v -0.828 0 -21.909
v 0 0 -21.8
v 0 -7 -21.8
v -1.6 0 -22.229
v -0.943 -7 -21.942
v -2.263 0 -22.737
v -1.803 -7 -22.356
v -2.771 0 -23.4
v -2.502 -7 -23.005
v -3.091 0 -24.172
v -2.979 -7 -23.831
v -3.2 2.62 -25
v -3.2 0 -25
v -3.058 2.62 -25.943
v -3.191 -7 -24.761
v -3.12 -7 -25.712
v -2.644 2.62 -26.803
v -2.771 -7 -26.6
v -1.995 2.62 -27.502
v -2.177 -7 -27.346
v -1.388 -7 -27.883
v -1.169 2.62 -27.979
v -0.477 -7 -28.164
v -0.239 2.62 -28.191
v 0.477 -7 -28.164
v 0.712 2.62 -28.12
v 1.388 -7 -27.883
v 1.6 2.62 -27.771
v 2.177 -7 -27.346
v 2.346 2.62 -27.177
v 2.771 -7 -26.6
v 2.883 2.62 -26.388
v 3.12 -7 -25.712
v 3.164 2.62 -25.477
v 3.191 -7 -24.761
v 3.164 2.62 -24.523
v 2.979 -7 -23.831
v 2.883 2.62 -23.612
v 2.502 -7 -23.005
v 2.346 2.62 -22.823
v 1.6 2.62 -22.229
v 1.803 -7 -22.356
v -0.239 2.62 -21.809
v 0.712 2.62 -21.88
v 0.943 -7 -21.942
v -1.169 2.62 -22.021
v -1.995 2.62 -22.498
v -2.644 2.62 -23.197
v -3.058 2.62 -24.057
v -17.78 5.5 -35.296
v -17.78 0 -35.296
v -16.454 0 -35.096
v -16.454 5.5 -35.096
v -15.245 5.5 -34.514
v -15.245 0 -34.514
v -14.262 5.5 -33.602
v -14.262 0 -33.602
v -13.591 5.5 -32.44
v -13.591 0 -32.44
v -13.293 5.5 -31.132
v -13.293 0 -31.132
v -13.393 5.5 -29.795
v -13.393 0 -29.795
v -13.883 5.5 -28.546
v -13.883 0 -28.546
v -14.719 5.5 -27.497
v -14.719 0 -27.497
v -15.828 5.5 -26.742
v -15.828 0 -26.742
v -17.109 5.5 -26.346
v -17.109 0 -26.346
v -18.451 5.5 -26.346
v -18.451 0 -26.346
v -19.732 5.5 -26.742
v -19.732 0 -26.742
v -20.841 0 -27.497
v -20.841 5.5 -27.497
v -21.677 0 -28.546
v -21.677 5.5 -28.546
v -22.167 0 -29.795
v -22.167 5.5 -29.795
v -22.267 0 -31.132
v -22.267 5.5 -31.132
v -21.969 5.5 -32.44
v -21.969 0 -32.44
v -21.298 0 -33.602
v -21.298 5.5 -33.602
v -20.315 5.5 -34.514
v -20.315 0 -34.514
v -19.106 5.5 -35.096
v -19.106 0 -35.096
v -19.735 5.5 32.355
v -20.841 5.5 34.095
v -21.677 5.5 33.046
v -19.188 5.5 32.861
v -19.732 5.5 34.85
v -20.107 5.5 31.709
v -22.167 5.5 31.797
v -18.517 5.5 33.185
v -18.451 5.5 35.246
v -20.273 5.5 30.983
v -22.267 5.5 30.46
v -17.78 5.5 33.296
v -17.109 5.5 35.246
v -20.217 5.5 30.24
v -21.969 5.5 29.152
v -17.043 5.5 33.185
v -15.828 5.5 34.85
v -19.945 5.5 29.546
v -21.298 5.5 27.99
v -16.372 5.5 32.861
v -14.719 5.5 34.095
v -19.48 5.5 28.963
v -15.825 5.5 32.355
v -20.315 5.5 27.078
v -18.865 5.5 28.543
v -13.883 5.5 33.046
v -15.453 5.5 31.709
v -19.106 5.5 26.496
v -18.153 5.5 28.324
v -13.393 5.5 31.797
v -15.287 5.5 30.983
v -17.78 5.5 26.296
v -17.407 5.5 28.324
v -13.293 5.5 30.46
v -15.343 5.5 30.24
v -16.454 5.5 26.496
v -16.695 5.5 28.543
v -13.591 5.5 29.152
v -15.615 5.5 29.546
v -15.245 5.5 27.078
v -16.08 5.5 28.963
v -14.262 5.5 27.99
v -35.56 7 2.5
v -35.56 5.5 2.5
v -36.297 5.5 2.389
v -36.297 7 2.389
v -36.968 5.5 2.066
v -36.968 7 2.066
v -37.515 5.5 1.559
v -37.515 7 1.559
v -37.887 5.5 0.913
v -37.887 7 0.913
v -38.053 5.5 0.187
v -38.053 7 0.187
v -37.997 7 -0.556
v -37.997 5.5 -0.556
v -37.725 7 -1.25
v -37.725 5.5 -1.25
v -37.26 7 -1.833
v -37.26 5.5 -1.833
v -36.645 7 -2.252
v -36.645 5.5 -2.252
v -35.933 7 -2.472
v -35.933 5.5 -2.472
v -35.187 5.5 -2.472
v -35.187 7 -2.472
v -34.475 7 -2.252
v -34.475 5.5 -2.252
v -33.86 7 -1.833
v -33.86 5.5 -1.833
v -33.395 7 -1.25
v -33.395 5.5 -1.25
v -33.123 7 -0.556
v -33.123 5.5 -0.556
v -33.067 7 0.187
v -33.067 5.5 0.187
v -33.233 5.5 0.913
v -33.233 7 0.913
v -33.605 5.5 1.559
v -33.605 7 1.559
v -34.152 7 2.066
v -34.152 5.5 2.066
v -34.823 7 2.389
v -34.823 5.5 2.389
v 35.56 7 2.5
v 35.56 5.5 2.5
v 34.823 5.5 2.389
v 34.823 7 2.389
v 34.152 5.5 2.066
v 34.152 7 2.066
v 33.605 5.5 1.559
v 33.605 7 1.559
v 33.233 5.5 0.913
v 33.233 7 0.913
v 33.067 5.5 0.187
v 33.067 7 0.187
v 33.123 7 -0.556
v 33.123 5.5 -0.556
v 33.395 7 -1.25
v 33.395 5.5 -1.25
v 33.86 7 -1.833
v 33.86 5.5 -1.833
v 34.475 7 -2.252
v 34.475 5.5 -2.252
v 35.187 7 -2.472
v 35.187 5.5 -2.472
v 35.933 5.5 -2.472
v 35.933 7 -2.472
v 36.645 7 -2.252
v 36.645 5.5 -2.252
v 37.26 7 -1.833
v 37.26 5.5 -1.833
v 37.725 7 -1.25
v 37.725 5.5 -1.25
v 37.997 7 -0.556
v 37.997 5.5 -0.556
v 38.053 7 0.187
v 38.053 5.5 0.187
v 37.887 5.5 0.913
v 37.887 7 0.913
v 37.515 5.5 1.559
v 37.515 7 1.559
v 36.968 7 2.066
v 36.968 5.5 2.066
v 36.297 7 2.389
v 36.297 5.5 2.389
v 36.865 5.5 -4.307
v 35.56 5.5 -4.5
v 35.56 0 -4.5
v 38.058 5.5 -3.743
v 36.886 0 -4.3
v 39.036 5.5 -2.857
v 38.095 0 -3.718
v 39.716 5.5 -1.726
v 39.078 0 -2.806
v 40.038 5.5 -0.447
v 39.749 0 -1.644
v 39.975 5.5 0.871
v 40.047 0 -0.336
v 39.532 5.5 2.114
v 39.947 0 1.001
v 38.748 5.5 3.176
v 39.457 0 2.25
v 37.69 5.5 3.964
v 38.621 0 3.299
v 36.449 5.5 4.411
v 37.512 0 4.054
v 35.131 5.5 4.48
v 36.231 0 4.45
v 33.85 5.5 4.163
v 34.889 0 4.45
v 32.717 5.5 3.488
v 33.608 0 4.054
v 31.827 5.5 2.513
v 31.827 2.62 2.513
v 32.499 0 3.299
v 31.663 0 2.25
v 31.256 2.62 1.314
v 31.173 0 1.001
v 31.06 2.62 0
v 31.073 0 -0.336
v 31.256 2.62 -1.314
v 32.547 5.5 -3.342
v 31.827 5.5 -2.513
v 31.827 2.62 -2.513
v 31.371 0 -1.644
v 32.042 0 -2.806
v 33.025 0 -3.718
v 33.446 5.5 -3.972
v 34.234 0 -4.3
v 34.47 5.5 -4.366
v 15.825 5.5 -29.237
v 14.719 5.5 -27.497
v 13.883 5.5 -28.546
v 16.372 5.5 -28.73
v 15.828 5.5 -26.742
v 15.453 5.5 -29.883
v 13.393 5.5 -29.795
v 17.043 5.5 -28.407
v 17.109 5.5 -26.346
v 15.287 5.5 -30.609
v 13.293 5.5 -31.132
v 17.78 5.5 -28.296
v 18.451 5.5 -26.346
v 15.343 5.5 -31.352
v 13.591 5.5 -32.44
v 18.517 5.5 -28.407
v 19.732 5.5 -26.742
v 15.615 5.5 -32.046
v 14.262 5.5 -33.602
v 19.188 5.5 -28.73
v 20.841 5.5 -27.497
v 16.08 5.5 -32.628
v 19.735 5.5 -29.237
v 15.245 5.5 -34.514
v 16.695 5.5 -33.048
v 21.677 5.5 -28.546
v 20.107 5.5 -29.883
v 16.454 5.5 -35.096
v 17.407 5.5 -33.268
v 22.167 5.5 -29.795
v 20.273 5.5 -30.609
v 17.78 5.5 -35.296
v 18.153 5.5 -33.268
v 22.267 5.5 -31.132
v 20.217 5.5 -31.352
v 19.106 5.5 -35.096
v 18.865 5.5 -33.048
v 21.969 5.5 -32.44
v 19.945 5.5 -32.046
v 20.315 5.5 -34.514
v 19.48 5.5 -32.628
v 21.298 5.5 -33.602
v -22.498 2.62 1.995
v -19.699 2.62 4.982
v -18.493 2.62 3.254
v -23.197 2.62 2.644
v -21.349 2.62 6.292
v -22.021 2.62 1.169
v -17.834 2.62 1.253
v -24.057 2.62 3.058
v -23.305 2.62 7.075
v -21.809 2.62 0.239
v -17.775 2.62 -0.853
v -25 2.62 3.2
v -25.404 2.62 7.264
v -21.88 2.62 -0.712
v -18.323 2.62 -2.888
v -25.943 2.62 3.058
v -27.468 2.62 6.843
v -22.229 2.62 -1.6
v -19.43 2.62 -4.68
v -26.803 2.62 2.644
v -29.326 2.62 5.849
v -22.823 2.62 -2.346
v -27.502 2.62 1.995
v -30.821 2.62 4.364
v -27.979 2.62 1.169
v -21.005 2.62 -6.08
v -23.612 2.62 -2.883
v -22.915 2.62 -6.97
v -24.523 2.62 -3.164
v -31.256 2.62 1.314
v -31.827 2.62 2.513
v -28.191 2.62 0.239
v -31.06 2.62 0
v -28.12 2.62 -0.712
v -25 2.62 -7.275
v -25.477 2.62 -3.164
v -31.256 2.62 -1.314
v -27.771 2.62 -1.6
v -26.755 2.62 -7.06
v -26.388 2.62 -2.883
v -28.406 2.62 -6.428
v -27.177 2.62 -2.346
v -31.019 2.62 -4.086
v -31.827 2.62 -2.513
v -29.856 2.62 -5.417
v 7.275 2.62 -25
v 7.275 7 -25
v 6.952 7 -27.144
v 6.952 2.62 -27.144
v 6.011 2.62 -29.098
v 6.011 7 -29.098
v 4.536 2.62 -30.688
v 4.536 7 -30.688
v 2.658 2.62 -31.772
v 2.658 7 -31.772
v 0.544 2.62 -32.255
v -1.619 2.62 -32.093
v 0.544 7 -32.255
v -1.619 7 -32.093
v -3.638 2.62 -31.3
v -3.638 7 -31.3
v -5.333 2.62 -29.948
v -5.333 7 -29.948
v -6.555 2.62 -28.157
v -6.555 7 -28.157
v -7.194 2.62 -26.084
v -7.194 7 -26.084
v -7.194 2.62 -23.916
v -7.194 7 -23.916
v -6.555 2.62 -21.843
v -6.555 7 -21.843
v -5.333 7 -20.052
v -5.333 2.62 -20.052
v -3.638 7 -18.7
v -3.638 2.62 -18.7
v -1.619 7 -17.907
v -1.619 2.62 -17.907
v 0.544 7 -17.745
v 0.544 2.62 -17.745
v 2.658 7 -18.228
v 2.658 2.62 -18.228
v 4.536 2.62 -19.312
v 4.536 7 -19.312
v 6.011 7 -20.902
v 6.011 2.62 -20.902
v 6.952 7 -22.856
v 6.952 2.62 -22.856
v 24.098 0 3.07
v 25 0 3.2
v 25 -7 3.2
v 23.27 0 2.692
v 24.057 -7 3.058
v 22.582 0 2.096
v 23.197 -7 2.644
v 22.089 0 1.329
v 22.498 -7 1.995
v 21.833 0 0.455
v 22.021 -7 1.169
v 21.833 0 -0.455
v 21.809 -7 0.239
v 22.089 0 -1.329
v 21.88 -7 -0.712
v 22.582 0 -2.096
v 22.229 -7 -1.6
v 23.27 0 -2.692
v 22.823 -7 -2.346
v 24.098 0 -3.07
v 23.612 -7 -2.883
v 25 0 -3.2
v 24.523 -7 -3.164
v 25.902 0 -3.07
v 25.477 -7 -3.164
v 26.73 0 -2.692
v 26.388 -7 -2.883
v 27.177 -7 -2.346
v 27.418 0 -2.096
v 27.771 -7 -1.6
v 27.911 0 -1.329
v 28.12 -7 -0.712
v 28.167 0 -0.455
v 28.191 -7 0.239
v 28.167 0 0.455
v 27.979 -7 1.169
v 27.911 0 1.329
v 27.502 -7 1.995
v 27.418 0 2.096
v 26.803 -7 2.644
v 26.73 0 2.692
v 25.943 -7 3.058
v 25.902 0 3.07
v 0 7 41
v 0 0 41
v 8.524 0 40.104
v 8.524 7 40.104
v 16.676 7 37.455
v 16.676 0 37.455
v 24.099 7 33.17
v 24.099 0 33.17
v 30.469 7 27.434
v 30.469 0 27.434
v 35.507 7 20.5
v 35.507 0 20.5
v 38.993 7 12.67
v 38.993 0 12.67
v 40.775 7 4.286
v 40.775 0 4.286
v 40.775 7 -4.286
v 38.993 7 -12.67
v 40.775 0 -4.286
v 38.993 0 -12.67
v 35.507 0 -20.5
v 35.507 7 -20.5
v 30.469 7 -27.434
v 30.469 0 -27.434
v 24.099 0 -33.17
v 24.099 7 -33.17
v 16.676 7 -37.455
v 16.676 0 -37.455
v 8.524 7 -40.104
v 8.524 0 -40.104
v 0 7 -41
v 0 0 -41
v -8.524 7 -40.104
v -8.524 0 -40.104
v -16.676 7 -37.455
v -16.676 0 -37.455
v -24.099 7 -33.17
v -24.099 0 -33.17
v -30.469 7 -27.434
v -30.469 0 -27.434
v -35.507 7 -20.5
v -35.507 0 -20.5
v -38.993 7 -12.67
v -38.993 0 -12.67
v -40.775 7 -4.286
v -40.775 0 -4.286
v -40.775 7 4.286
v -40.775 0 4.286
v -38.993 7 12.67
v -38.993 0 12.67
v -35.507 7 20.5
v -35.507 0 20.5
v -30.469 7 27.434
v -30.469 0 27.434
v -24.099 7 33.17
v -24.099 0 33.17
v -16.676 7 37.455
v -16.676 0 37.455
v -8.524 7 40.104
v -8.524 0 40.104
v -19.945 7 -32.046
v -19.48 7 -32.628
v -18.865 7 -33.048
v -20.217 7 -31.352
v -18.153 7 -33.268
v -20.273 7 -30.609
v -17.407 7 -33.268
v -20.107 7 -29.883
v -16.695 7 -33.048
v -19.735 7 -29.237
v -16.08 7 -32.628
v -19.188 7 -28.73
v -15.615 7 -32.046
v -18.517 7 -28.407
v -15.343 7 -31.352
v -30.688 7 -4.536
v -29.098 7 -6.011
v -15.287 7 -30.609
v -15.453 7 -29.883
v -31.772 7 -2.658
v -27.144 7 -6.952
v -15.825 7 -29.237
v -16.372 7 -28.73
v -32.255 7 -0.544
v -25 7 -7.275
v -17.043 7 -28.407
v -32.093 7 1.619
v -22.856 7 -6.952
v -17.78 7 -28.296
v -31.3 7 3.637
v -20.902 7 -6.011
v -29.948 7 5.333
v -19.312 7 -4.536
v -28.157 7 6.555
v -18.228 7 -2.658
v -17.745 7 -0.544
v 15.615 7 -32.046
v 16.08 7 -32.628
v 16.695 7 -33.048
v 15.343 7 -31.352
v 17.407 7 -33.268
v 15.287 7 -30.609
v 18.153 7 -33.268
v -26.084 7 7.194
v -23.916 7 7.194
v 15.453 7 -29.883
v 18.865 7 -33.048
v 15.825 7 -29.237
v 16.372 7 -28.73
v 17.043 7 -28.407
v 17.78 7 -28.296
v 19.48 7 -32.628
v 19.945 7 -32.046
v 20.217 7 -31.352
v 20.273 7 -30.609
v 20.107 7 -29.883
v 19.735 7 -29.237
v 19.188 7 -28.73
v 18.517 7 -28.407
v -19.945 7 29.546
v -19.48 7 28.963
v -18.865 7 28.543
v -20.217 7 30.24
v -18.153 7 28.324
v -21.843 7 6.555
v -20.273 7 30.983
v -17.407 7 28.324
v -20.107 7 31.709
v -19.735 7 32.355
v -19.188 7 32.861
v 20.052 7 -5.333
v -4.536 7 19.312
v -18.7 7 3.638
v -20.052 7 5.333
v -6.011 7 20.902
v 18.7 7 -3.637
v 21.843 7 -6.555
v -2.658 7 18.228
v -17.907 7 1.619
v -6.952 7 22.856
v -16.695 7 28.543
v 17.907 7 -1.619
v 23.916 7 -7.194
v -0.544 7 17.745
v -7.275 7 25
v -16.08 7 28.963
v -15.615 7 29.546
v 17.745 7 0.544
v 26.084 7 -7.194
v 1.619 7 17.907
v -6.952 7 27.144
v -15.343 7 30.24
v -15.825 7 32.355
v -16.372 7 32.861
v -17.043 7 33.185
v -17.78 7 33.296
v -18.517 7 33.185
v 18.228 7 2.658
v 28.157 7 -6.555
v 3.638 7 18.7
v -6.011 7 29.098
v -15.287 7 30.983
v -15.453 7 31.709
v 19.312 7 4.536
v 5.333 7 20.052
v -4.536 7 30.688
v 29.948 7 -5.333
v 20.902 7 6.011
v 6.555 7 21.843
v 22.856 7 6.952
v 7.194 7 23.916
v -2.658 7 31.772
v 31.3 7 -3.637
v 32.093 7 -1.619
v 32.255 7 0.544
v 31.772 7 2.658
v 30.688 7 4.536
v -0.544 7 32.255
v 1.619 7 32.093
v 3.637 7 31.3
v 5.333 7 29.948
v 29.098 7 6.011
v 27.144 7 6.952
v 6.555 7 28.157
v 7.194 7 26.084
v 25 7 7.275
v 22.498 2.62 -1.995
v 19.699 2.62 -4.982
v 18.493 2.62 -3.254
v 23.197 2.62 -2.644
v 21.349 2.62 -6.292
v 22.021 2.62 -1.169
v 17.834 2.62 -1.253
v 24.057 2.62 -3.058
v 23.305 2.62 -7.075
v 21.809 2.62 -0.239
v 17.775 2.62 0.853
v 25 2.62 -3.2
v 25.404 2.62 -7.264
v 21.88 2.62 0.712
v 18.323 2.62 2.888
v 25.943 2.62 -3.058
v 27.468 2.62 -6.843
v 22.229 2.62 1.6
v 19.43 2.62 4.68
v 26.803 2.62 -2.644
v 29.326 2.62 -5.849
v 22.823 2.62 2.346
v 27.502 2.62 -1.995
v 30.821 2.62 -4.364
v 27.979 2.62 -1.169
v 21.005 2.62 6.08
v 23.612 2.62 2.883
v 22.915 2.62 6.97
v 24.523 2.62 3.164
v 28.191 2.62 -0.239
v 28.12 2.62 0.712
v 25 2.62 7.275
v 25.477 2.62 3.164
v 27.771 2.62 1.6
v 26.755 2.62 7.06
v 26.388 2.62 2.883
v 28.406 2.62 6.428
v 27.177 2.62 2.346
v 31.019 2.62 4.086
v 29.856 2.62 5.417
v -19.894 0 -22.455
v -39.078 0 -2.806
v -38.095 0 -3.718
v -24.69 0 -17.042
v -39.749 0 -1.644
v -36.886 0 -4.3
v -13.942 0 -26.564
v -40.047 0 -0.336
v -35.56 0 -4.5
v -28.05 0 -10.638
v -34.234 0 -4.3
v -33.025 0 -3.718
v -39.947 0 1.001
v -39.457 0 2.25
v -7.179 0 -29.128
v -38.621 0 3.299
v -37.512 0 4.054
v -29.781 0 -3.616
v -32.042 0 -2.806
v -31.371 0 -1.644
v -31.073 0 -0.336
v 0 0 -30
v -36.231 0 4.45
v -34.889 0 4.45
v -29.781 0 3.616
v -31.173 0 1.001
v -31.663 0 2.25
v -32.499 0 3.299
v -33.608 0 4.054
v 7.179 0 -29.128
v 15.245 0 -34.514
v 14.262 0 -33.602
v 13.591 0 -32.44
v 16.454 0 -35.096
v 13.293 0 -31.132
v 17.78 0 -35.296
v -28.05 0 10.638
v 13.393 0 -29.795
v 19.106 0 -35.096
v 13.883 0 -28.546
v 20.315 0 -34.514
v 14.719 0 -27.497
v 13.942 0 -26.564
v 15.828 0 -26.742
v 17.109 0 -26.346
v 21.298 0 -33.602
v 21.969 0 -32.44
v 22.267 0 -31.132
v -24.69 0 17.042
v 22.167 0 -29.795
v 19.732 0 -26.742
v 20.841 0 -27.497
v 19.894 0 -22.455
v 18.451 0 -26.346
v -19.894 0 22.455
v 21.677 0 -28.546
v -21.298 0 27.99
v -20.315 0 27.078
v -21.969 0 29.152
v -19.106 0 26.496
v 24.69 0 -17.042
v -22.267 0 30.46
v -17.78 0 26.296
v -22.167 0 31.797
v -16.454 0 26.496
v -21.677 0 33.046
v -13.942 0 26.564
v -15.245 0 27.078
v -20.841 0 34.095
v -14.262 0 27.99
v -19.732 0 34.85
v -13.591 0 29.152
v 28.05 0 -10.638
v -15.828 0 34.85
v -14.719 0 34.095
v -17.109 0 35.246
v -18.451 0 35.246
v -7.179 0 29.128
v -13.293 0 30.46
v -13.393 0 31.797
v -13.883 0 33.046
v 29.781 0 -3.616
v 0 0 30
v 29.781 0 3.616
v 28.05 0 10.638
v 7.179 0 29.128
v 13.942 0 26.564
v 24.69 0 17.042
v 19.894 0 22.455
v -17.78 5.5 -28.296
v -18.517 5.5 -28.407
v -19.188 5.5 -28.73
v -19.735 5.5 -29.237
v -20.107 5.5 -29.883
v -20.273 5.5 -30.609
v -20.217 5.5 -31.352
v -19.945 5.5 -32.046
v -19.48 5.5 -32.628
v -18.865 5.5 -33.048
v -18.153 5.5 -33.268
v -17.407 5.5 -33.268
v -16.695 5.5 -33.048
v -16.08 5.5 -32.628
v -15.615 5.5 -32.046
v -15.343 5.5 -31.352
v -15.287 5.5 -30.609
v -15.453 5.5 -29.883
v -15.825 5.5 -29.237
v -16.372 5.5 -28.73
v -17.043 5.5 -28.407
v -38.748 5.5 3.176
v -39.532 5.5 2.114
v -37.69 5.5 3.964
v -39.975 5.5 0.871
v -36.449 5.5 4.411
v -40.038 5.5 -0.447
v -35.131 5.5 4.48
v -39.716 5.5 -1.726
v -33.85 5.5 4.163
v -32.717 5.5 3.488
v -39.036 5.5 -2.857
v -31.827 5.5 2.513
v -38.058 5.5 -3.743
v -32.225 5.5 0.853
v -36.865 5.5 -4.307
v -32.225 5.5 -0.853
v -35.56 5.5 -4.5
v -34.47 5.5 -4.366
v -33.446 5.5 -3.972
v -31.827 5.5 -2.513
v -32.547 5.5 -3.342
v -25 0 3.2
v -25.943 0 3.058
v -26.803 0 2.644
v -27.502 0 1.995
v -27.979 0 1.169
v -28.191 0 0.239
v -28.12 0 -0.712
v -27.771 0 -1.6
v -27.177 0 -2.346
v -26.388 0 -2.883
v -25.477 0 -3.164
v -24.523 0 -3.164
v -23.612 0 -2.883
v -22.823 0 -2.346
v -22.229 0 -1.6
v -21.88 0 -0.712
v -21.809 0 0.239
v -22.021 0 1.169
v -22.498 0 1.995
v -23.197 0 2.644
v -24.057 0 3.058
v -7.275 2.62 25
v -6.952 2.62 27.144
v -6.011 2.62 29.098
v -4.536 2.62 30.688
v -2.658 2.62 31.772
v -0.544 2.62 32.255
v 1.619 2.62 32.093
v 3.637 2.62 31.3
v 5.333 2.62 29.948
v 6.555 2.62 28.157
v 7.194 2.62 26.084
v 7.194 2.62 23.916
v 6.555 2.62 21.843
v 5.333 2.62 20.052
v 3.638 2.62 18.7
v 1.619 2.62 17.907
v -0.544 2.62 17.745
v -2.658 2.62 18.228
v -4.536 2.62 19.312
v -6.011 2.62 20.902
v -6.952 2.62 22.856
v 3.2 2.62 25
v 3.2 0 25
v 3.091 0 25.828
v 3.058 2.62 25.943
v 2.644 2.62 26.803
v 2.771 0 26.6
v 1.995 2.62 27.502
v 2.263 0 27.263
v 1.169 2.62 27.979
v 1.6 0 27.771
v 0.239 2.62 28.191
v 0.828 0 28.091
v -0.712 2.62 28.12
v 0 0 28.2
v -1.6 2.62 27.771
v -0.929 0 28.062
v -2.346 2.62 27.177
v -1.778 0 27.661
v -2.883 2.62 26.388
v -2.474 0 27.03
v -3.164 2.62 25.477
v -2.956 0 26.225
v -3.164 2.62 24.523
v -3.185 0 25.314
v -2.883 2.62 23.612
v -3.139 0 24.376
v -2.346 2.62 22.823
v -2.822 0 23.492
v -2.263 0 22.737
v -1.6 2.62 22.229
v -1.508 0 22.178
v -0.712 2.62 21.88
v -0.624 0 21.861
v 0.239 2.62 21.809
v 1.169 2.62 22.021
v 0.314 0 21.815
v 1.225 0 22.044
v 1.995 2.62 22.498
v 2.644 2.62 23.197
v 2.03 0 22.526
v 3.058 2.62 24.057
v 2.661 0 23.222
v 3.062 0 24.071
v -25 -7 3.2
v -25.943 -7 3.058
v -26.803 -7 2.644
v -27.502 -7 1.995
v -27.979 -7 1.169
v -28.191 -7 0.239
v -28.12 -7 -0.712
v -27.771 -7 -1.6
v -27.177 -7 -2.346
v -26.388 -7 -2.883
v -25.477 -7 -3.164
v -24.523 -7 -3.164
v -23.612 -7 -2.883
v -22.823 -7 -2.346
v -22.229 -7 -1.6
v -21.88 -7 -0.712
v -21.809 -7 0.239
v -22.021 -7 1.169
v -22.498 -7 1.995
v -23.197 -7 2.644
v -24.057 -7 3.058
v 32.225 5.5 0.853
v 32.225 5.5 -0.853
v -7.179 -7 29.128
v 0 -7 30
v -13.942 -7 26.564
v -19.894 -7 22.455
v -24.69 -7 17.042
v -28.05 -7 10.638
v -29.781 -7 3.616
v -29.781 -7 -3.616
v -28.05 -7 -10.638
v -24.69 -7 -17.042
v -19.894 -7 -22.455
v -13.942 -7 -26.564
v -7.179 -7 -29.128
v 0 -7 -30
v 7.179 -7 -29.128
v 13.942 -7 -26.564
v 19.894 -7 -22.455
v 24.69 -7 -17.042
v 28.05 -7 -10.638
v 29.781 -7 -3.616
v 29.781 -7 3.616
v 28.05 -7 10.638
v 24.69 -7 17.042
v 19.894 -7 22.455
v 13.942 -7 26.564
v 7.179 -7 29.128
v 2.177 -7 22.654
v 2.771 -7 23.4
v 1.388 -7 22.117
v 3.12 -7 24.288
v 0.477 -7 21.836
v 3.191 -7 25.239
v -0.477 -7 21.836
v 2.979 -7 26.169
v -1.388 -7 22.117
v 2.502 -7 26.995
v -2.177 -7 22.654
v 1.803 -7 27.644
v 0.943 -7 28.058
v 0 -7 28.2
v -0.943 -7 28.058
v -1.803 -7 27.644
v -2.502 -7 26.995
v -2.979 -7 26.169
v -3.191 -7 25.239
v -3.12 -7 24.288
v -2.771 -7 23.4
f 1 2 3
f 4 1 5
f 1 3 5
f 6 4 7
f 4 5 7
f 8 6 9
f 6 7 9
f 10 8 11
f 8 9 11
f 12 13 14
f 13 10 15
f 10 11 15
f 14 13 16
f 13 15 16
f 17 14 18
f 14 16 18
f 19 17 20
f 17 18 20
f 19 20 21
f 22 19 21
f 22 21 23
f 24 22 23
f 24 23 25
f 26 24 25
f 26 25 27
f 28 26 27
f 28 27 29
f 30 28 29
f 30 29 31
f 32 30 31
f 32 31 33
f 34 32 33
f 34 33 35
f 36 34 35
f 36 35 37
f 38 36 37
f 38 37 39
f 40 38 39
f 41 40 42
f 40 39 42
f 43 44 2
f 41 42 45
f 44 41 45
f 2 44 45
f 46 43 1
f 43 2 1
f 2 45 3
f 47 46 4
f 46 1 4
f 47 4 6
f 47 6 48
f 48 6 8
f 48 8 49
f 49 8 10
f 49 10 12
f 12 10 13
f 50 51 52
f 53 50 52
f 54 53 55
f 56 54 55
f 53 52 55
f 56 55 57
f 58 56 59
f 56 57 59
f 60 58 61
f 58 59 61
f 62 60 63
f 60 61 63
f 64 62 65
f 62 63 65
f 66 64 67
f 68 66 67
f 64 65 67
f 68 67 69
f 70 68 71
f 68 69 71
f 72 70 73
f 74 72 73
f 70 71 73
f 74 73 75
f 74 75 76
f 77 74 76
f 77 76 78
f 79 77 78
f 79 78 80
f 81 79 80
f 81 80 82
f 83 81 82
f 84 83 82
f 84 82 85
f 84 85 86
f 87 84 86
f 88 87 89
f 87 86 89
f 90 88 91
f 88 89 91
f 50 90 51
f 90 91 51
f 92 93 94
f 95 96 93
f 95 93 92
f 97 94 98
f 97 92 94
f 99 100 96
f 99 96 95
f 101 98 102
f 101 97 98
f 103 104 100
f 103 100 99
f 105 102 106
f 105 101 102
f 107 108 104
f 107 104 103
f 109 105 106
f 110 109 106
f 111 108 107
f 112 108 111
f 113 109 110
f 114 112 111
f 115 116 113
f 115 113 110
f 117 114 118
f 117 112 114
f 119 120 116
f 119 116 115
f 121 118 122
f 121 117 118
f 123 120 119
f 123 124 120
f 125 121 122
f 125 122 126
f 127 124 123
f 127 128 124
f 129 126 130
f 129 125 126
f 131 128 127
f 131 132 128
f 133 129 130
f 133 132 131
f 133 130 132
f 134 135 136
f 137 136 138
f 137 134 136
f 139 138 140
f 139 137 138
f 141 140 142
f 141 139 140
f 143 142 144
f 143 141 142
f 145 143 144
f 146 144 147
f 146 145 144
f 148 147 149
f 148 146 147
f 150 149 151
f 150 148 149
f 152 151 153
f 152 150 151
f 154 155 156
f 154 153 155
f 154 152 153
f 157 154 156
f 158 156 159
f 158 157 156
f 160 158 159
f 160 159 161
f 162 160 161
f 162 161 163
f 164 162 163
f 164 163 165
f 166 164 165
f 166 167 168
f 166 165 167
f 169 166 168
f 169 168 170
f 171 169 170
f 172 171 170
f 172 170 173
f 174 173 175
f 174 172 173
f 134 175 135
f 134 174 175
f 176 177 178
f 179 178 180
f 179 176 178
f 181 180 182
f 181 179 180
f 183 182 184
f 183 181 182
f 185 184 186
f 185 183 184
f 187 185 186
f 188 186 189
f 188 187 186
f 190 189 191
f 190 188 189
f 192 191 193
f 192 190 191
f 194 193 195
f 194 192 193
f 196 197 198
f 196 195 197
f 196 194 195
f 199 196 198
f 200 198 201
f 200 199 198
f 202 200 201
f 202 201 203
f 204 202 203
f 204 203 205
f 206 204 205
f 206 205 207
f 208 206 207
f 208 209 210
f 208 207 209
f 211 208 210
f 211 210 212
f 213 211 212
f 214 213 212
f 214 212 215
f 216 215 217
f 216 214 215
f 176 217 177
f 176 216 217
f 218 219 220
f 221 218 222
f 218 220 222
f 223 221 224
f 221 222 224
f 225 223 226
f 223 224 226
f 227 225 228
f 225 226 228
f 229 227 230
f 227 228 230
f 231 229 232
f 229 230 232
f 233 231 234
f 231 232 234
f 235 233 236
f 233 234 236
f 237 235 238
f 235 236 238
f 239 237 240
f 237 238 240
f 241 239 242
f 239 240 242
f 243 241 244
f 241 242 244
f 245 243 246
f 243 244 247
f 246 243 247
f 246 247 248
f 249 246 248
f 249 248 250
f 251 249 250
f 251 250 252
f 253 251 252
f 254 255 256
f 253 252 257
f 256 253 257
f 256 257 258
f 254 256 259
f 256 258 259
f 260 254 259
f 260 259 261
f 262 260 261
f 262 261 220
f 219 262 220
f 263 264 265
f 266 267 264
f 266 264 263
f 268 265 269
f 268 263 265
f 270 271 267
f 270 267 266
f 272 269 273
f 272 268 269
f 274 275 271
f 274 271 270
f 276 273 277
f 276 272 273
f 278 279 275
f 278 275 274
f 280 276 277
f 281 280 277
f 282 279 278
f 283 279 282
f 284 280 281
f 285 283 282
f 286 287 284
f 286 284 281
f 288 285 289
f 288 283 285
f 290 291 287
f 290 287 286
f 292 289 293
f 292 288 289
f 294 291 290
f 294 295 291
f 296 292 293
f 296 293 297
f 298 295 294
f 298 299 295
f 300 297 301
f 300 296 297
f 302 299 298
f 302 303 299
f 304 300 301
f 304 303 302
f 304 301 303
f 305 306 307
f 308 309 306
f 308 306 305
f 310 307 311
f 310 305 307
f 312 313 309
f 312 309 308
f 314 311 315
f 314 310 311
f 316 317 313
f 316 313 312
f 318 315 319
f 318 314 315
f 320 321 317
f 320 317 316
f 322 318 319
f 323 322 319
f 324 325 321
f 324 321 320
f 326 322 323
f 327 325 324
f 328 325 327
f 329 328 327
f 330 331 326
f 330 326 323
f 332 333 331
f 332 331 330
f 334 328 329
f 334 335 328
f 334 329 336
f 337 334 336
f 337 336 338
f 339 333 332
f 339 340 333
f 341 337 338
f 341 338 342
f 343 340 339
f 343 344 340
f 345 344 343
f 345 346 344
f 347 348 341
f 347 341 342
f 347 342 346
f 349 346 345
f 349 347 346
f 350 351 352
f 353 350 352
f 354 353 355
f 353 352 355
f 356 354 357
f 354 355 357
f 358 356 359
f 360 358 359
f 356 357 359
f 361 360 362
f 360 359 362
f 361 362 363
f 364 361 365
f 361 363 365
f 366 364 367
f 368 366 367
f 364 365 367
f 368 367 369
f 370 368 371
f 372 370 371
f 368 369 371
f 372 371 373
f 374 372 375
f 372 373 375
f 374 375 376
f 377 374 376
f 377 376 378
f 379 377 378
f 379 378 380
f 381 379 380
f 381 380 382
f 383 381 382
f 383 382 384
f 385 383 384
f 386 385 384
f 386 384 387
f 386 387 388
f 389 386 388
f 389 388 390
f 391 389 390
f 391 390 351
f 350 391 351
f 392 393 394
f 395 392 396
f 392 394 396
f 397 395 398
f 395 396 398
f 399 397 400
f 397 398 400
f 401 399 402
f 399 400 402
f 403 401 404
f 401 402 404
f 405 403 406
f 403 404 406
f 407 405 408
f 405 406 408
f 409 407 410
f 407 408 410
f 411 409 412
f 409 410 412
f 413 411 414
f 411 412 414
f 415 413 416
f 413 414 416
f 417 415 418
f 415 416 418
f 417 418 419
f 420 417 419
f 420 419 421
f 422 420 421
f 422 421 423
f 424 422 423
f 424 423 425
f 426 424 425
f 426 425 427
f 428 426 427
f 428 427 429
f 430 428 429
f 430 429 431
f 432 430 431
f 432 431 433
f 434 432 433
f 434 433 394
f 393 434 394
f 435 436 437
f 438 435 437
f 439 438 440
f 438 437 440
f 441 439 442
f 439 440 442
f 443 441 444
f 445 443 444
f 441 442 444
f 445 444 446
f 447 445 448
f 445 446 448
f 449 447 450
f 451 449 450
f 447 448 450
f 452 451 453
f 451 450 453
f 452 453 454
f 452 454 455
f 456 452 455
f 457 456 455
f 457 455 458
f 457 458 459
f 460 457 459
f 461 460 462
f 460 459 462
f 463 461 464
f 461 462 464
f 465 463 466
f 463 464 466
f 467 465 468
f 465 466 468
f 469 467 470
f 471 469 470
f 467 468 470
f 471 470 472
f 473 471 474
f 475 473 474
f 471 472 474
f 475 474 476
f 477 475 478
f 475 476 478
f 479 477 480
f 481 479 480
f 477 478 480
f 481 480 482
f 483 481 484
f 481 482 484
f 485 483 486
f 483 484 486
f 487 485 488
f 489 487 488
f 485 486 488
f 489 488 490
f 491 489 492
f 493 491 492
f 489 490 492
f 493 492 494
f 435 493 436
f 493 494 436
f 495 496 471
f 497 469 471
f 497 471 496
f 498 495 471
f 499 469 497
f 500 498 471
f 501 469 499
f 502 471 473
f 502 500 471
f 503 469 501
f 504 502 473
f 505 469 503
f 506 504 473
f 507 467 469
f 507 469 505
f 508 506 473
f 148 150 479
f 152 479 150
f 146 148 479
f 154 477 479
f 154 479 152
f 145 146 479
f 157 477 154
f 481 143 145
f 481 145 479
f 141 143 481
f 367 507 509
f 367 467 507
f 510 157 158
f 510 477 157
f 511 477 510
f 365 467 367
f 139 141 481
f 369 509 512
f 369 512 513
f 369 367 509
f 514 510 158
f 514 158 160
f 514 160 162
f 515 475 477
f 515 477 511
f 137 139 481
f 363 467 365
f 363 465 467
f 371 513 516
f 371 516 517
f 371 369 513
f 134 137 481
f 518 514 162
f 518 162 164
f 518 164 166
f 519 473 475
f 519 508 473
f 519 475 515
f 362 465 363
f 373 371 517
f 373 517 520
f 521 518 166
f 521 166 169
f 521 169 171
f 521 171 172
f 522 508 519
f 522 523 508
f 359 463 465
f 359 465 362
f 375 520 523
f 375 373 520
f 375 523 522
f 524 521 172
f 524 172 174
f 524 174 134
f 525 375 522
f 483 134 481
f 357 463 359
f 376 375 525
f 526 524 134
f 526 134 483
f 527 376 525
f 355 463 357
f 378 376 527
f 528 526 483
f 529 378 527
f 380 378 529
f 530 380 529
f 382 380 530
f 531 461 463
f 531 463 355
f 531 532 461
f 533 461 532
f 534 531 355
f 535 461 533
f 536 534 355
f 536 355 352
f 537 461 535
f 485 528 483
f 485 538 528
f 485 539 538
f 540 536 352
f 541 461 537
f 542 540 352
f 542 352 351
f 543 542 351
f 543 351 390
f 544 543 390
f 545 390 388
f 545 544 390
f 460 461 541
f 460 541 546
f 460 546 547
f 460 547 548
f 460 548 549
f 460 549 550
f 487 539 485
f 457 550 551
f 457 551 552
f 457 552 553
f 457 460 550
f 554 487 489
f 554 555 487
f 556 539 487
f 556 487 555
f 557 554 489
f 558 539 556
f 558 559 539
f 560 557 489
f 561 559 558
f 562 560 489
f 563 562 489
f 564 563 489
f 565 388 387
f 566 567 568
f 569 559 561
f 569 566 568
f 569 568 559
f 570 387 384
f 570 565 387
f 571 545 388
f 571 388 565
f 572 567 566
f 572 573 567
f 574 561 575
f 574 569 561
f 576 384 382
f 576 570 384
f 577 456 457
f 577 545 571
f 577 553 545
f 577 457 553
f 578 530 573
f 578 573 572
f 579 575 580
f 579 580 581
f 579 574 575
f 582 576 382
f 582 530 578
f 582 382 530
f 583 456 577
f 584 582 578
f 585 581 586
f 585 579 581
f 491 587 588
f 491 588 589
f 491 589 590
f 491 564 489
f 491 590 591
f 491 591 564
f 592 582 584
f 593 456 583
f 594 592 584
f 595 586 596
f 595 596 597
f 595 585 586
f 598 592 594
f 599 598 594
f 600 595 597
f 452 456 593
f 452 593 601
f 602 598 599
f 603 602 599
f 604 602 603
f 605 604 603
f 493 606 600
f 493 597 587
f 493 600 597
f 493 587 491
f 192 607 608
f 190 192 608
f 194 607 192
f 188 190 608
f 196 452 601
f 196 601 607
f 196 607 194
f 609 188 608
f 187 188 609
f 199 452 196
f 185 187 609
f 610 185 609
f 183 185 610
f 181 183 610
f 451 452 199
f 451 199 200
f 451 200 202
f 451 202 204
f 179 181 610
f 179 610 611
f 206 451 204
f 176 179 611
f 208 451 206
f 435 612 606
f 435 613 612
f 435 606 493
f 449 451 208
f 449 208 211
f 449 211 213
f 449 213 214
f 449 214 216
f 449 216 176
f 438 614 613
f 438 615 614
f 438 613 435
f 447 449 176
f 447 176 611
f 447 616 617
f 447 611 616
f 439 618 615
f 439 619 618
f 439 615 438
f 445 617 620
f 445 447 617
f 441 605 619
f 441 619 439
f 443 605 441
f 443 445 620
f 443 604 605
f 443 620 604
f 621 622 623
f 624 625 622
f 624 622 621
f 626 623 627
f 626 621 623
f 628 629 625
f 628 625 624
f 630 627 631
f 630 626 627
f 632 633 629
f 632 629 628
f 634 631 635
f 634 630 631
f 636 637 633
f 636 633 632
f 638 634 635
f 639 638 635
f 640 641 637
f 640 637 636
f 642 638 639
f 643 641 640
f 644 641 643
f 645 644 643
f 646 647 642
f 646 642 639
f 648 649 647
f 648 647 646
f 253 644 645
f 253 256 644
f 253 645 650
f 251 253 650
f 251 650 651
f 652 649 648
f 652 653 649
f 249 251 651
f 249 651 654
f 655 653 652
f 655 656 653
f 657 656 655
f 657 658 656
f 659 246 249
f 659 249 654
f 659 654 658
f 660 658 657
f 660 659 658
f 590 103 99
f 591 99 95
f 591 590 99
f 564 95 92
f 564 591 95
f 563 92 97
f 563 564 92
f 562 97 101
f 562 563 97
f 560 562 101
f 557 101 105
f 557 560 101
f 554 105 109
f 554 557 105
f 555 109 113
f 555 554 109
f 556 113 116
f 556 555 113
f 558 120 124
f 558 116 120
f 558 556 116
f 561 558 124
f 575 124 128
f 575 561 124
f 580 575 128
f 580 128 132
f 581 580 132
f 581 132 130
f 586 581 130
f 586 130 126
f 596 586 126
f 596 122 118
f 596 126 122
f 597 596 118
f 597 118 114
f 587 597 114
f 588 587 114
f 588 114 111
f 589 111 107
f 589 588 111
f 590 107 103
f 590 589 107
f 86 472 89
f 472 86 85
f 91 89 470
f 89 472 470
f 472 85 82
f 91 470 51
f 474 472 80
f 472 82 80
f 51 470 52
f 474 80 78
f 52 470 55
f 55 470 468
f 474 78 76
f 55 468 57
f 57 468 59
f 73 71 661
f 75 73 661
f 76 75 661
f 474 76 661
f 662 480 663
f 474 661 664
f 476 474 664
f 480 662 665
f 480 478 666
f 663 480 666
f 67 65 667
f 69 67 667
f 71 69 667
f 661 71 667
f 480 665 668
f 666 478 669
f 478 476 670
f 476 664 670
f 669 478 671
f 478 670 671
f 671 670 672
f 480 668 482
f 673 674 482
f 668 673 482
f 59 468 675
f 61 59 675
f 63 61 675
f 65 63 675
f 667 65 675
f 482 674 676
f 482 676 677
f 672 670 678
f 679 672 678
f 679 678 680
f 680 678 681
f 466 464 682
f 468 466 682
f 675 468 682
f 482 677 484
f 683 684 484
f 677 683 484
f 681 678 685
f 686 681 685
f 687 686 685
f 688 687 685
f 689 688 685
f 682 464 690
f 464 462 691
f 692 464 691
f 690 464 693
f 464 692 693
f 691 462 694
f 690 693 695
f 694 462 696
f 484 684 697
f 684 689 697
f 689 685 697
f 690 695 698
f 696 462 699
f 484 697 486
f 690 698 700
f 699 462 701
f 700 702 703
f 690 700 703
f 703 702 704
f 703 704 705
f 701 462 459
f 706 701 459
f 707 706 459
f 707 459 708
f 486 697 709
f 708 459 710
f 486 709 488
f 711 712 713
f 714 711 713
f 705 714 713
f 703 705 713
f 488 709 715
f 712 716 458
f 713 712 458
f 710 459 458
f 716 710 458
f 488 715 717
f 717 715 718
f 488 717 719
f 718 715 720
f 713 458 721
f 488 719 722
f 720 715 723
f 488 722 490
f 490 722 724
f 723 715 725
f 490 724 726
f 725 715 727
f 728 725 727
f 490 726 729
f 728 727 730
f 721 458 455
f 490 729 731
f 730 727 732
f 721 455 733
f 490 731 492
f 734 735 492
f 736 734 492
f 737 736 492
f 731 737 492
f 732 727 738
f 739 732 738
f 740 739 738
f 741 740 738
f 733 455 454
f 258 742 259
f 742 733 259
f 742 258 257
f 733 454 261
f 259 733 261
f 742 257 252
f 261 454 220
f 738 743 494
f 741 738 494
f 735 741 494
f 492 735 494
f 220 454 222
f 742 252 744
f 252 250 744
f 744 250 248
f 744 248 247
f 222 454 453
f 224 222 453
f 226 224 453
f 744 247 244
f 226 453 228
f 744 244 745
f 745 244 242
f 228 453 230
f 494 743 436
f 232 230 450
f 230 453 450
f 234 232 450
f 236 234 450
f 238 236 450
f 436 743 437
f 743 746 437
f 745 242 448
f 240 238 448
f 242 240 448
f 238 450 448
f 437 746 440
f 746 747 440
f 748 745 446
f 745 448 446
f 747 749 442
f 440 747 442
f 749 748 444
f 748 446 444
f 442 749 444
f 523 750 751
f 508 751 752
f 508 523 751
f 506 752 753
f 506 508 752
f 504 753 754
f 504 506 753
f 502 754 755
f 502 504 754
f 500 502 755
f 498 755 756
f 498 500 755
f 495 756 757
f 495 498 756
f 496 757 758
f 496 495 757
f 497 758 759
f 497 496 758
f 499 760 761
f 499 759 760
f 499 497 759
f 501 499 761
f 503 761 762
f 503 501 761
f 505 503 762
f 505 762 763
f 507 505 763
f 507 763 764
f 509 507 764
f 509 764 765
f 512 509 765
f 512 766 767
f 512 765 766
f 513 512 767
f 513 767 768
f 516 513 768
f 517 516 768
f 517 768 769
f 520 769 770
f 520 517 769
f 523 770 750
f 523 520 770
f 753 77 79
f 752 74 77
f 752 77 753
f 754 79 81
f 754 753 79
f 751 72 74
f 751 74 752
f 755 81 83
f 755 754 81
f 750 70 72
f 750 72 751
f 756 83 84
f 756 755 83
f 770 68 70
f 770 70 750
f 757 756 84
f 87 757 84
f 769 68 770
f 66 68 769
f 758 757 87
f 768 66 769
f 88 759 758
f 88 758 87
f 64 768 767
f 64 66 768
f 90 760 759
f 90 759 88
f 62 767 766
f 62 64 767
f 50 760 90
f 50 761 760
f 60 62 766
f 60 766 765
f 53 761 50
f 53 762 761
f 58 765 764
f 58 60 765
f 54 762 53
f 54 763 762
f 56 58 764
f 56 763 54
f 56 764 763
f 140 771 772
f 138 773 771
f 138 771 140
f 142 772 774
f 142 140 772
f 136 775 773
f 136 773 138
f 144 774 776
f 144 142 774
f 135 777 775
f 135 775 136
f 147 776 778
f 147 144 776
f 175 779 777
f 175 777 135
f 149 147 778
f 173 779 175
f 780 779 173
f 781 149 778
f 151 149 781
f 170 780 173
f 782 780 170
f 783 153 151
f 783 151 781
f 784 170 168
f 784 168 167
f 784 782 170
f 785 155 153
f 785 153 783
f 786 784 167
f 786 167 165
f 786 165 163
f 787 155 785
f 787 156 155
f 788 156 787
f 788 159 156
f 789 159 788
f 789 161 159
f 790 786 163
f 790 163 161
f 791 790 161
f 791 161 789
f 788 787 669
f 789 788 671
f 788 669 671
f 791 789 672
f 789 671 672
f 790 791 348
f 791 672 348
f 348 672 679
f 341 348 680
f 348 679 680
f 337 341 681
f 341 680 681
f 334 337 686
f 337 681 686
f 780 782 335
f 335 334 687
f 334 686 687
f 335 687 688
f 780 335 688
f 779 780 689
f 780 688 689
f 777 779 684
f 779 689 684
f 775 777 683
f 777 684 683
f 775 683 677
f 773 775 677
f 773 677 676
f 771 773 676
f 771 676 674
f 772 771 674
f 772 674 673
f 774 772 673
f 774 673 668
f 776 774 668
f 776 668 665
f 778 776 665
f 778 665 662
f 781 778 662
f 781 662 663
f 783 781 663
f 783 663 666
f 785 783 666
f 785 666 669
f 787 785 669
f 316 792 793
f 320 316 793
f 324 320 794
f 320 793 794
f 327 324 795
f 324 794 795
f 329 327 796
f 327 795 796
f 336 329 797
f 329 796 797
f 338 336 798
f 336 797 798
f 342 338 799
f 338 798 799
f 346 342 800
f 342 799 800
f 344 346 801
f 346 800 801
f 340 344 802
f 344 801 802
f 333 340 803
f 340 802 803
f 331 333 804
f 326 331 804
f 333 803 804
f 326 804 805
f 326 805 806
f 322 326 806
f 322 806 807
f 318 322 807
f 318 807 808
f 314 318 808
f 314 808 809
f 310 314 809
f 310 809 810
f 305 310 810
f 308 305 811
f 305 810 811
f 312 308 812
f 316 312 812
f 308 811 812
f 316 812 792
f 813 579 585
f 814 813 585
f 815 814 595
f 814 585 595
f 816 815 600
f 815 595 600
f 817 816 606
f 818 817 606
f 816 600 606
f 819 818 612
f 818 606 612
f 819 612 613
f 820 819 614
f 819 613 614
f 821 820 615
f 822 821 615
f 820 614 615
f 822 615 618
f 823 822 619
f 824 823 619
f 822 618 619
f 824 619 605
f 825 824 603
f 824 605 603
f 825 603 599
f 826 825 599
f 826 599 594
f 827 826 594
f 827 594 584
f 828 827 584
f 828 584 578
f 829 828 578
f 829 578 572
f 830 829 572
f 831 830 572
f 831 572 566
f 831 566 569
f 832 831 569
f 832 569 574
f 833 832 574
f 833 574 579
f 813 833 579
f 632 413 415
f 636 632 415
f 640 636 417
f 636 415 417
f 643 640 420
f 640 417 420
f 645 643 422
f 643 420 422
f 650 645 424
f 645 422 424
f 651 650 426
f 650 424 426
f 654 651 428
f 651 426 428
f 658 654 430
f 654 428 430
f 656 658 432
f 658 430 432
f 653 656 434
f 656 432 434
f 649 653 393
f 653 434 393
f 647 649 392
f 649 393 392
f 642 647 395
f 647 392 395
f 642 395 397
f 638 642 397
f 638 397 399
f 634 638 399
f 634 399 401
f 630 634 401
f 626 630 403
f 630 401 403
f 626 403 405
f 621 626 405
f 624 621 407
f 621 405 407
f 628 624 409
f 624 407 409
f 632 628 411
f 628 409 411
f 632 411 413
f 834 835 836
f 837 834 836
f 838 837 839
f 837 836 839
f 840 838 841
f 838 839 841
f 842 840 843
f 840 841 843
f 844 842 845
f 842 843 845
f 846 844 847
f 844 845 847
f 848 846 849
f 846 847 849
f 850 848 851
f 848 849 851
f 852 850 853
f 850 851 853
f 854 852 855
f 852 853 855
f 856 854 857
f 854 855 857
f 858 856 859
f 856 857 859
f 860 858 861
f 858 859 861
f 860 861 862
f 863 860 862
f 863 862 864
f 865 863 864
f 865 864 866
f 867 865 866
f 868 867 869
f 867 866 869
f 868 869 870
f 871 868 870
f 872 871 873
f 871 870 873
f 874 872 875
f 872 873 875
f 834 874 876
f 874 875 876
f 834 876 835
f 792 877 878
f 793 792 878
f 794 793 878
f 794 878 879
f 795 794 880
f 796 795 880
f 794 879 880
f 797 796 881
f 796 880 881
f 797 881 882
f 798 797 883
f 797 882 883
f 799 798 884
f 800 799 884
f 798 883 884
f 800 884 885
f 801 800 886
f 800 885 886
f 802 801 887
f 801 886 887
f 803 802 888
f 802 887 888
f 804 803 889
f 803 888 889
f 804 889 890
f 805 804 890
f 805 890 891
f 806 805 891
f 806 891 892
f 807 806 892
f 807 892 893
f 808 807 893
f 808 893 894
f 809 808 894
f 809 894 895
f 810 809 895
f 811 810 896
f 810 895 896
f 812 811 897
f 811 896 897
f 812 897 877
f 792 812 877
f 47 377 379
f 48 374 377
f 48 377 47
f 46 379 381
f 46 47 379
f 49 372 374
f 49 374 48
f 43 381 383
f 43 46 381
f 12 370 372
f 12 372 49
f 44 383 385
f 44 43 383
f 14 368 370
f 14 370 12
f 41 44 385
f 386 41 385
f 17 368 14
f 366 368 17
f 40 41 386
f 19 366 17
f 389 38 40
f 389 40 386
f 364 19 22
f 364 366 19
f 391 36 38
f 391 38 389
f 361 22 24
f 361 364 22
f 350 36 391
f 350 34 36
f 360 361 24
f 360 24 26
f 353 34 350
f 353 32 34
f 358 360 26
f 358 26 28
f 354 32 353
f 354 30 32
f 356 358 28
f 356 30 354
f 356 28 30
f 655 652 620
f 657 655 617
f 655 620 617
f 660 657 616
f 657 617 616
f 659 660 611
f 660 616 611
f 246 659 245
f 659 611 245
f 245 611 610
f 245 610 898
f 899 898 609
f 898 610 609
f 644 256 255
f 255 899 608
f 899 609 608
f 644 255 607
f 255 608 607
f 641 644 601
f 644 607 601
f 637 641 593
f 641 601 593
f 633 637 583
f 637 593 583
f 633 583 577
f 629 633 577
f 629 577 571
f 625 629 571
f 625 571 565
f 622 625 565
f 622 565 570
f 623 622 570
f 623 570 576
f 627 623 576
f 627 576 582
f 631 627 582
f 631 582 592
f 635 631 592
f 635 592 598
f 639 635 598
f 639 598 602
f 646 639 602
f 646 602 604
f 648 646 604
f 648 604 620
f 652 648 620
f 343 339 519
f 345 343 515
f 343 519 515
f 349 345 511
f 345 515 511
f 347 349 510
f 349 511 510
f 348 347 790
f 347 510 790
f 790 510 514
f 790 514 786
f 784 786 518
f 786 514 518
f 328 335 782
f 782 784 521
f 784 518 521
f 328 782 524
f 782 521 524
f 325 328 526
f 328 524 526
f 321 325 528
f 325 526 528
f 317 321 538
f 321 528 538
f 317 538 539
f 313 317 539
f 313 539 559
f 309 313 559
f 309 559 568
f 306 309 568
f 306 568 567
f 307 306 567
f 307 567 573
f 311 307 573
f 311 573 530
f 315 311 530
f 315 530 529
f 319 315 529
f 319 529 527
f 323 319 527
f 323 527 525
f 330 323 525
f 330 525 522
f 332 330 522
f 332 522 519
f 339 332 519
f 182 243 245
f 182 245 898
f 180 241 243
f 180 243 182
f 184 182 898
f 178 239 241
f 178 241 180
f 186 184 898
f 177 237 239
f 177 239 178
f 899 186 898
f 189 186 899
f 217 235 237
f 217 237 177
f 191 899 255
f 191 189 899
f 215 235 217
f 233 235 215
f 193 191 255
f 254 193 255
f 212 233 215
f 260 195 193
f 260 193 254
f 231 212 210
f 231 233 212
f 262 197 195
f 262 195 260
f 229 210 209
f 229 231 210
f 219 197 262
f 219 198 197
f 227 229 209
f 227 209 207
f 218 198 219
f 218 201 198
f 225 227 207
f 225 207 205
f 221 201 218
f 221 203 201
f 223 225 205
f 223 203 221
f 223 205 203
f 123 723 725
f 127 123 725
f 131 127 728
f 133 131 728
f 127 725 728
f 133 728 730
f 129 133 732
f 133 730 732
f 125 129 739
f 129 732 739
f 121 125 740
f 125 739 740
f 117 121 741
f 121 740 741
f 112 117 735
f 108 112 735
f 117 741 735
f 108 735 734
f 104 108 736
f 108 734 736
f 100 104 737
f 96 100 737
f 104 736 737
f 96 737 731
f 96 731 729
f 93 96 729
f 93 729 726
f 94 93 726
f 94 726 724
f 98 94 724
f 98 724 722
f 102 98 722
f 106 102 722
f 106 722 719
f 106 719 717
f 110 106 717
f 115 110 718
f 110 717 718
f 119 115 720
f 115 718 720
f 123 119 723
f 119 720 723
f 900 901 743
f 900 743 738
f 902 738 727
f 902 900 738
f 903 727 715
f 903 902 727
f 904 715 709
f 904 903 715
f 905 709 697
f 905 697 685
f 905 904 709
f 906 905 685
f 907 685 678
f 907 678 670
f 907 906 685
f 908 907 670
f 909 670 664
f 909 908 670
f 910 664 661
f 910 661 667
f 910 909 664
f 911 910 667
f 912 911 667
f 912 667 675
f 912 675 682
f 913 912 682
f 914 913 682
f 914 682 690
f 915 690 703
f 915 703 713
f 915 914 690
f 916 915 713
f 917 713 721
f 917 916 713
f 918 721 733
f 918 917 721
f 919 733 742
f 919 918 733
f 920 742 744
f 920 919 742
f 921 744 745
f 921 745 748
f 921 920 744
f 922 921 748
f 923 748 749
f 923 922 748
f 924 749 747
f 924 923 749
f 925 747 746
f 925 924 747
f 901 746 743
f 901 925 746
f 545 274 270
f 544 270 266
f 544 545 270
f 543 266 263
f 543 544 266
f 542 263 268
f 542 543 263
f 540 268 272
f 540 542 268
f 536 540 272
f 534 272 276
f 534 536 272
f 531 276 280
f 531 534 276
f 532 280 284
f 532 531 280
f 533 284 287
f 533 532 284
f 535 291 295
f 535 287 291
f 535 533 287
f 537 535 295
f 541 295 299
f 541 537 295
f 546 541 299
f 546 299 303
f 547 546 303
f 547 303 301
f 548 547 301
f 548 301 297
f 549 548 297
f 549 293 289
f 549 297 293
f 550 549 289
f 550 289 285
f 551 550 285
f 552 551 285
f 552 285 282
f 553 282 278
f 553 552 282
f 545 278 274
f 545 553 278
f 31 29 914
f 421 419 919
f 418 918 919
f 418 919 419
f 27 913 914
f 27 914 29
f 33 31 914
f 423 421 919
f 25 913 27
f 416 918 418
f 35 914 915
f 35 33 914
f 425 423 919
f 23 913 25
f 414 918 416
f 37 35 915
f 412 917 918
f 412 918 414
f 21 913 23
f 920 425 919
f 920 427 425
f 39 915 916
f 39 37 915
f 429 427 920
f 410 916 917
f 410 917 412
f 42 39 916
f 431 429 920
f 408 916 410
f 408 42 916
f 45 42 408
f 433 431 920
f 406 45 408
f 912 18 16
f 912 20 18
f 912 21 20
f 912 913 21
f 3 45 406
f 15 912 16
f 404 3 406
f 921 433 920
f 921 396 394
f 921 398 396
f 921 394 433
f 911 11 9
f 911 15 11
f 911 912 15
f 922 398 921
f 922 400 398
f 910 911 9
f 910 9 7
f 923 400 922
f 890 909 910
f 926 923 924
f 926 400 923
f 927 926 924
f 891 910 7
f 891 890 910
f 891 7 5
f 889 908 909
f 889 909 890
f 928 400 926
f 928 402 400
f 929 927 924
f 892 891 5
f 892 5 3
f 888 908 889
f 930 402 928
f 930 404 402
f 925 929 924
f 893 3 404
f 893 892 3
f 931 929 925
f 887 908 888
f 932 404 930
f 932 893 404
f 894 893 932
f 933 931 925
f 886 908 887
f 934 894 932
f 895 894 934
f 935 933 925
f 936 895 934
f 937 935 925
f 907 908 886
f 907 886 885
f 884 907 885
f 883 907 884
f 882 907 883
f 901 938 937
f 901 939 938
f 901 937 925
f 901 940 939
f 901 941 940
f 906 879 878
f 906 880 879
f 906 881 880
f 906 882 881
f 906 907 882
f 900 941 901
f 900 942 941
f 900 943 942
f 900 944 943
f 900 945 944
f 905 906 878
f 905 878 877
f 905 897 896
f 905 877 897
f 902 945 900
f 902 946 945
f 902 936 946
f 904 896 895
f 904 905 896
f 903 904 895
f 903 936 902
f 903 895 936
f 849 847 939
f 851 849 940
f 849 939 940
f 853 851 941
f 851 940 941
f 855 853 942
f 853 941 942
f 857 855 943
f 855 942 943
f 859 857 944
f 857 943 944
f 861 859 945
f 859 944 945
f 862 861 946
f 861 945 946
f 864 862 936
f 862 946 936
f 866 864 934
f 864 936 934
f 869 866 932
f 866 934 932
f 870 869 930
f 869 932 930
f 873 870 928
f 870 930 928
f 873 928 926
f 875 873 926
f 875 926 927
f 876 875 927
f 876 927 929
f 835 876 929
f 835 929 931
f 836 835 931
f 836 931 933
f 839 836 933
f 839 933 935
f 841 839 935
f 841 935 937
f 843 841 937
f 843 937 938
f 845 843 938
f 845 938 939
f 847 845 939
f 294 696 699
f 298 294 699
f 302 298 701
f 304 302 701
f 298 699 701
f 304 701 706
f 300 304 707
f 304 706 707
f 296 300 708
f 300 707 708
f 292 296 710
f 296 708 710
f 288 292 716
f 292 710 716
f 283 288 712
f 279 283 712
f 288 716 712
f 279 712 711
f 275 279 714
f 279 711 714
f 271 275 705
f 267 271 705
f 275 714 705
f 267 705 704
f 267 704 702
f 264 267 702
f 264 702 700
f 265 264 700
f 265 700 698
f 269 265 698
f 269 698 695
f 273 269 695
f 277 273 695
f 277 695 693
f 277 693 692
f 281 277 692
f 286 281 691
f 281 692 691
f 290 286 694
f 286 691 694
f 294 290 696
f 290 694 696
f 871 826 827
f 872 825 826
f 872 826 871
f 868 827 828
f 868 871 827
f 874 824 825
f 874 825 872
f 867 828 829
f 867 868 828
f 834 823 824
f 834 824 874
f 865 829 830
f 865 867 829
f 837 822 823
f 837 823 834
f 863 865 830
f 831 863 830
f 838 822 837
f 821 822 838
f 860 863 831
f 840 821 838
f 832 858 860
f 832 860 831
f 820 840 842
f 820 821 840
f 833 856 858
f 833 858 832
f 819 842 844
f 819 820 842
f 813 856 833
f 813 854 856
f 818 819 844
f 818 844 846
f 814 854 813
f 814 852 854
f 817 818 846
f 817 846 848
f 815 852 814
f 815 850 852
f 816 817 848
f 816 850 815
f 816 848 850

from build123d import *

# Parameters (mm, degrees)
SKETCH1_R                               = 41
BOSS_EXTRUDE1_DEPTH                     = 7
CBORE_FOR_M6_HEX_HEAD_BOLT1_D           = 6.4
CBORE_FOR_M6_HEX_HEAD_BOLT1_CBORE_D     = 14.55
CBORE_FOR_M6_HEX_HEAD_BOLT1_CBORE_DEPTH = 4.38
CIRPATTERN2_COUNT                       = 4
CUT_EXTRUDE4_START                      = -7
SKETCH15_R                              = 2.5
CUT_EXTRUDE4_DEPTH                      = 66.403767002
SKETCH16_R                              = 4.5
CUT_EXTRUDE5_DEPTH                      = 5.5
BOSS_EXTRUDE2_START                     = 7
SKETCH17_R                              = 30
SKETCH17_R_2                            = 3.2
BOSS_EXTRUDE2_DEPTH                     = 7


with BuildPart() as part:
    # Sketch1 → Boss-Extrude1 (new body)
    with BuildSketch(Plane(origin=(0, 0, 0), x_dir=(1, 0, 0), z_dir=(0, 1, 0))):
        with Locations(Location((0, 0, 0), (0, 0, 270))):
            Circle(SKETCH1_R)
    extrude(amount=BOSS_EXTRUDE1_DEPTH)

    # CBORE for M6 Hex Head Bolt1 (through all)
    with Locations(Plane(origin=(0, 7, 0), x_dir=(1, 0, 0), z_dir=(0, 1, 0))):
        with Locations((0, 25)):
            cbore_for_m6_hex_head_bolt1 = CounterBoreHole(CBORE_FOR_M6_HEX_HEAD_BOLT1_D / 2, CBORE_FOR_M6_HEX_HEAD_BOLT1_CBORE_D / 2, CBORE_FOR_M6_HEX_HEAD_BOLT1_CBORE_DEPTH)

    # CirPattern2: CBORE for M6 Hex Head Bolt1 ×4 about axis
    cirpattern2_axis = Axis((0, 0, 0), (0, 1, 0))
    for i in range(1, CIRPATTERN2_COUNT):
        add(cbore_for_m6_hex_head_bolt1.rotate(cirpattern2_axis, i * 360 / CIRPATTERN2_COUNT), mode=Mode.SUBTRACT)

    # Sketch15 → Cut-Extrude4 (cut, through all)
    with BuildSketch(Plane.XZ.offset(CUT_EXTRUDE4_START)):
        with Locations(Location((35.56, 0, 0), (0, 0, 90))):
            Circle(SKETCH15_R)
        with Locations(Location((17.78, -30.795863359, 0), (0, 0, 90))):
            Circle(SKETCH15_R)
        with Locations(Location((-17.78, -30.795863359, 0), (0, 0, 90))):
            Circle(SKETCH15_R)
        with Locations(Location((-35.56, 0, 0), (0, 0, 90))):
            Circle(SKETCH15_R)
        with Locations(Location((-17.78, 30.795863359, 0), (0, 0, 90))):
            Circle(SKETCH15_R)
    extrude(amount=CUT_EXTRUDE4_DEPTH, mode=Mode.SUBTRACT)

    # Sketch16 → Cut-Extrude5 (cut)
    with BuildSketch(Plane.XZ):
        with Locations(Location((-17.78, 30.795863359, 0), (0, 0, 270))):
            Circle(SKETCH16_R)
        with Locations(Location((-35.56, 0, 0), (0, 0, 270))):
            Circle(SKETCH16_R)
        with Locations(Location((35.56, 0, 0), (0, 0, 270))):
            Circle(SKETCH16_R)
        with Locations(Location((-17.78, -30.795863359, 0), (0, 0, 270))):
            Circle(SKETCH16_R)
        with Locations(Location((17.78, -30.795863359, 0), (0, 0, 270))):
            Circle(SKETCH16_R)
    extrude(amount=-CUT_EXTRUDE5_DEPTH, mode=Mode.SUBTRACT)

    # Sketch17 → Boss-Extrude2 (add)
    with BuildSketch(Plane.XZ.offset(BOSS_EXTRUDE2_START)):
        with Locations(Location((0, 0, 0), (0, 0, 90))):
            Circle(SKETCH17_R)
        with Locations(Location((25, 0, 0), (0, 0, 90))):
            Circle(SKETCH17_R_2, mode=Mode.SUBTRACT)
        with Locations(Location((0, -25, 0), (0, 0, 90))):
            Circle(SKETCH17_R_2, mode=Mode.SUBTRACT)
        with Locations(Location((-25, 0, 0), (0, 0, 90))):
            Circle(SKETCH17_R_2, mode=Mode.SUBTRACT)
        with Locations(Location((0, 25, 0), (0, 0, 90))):
            Circle(SKETCH17_R_2, mode=Mode.SUBTRACT)
    extrude(amount=-BOSS_EXTRUDE2_DEPTH)


solid = part.part
